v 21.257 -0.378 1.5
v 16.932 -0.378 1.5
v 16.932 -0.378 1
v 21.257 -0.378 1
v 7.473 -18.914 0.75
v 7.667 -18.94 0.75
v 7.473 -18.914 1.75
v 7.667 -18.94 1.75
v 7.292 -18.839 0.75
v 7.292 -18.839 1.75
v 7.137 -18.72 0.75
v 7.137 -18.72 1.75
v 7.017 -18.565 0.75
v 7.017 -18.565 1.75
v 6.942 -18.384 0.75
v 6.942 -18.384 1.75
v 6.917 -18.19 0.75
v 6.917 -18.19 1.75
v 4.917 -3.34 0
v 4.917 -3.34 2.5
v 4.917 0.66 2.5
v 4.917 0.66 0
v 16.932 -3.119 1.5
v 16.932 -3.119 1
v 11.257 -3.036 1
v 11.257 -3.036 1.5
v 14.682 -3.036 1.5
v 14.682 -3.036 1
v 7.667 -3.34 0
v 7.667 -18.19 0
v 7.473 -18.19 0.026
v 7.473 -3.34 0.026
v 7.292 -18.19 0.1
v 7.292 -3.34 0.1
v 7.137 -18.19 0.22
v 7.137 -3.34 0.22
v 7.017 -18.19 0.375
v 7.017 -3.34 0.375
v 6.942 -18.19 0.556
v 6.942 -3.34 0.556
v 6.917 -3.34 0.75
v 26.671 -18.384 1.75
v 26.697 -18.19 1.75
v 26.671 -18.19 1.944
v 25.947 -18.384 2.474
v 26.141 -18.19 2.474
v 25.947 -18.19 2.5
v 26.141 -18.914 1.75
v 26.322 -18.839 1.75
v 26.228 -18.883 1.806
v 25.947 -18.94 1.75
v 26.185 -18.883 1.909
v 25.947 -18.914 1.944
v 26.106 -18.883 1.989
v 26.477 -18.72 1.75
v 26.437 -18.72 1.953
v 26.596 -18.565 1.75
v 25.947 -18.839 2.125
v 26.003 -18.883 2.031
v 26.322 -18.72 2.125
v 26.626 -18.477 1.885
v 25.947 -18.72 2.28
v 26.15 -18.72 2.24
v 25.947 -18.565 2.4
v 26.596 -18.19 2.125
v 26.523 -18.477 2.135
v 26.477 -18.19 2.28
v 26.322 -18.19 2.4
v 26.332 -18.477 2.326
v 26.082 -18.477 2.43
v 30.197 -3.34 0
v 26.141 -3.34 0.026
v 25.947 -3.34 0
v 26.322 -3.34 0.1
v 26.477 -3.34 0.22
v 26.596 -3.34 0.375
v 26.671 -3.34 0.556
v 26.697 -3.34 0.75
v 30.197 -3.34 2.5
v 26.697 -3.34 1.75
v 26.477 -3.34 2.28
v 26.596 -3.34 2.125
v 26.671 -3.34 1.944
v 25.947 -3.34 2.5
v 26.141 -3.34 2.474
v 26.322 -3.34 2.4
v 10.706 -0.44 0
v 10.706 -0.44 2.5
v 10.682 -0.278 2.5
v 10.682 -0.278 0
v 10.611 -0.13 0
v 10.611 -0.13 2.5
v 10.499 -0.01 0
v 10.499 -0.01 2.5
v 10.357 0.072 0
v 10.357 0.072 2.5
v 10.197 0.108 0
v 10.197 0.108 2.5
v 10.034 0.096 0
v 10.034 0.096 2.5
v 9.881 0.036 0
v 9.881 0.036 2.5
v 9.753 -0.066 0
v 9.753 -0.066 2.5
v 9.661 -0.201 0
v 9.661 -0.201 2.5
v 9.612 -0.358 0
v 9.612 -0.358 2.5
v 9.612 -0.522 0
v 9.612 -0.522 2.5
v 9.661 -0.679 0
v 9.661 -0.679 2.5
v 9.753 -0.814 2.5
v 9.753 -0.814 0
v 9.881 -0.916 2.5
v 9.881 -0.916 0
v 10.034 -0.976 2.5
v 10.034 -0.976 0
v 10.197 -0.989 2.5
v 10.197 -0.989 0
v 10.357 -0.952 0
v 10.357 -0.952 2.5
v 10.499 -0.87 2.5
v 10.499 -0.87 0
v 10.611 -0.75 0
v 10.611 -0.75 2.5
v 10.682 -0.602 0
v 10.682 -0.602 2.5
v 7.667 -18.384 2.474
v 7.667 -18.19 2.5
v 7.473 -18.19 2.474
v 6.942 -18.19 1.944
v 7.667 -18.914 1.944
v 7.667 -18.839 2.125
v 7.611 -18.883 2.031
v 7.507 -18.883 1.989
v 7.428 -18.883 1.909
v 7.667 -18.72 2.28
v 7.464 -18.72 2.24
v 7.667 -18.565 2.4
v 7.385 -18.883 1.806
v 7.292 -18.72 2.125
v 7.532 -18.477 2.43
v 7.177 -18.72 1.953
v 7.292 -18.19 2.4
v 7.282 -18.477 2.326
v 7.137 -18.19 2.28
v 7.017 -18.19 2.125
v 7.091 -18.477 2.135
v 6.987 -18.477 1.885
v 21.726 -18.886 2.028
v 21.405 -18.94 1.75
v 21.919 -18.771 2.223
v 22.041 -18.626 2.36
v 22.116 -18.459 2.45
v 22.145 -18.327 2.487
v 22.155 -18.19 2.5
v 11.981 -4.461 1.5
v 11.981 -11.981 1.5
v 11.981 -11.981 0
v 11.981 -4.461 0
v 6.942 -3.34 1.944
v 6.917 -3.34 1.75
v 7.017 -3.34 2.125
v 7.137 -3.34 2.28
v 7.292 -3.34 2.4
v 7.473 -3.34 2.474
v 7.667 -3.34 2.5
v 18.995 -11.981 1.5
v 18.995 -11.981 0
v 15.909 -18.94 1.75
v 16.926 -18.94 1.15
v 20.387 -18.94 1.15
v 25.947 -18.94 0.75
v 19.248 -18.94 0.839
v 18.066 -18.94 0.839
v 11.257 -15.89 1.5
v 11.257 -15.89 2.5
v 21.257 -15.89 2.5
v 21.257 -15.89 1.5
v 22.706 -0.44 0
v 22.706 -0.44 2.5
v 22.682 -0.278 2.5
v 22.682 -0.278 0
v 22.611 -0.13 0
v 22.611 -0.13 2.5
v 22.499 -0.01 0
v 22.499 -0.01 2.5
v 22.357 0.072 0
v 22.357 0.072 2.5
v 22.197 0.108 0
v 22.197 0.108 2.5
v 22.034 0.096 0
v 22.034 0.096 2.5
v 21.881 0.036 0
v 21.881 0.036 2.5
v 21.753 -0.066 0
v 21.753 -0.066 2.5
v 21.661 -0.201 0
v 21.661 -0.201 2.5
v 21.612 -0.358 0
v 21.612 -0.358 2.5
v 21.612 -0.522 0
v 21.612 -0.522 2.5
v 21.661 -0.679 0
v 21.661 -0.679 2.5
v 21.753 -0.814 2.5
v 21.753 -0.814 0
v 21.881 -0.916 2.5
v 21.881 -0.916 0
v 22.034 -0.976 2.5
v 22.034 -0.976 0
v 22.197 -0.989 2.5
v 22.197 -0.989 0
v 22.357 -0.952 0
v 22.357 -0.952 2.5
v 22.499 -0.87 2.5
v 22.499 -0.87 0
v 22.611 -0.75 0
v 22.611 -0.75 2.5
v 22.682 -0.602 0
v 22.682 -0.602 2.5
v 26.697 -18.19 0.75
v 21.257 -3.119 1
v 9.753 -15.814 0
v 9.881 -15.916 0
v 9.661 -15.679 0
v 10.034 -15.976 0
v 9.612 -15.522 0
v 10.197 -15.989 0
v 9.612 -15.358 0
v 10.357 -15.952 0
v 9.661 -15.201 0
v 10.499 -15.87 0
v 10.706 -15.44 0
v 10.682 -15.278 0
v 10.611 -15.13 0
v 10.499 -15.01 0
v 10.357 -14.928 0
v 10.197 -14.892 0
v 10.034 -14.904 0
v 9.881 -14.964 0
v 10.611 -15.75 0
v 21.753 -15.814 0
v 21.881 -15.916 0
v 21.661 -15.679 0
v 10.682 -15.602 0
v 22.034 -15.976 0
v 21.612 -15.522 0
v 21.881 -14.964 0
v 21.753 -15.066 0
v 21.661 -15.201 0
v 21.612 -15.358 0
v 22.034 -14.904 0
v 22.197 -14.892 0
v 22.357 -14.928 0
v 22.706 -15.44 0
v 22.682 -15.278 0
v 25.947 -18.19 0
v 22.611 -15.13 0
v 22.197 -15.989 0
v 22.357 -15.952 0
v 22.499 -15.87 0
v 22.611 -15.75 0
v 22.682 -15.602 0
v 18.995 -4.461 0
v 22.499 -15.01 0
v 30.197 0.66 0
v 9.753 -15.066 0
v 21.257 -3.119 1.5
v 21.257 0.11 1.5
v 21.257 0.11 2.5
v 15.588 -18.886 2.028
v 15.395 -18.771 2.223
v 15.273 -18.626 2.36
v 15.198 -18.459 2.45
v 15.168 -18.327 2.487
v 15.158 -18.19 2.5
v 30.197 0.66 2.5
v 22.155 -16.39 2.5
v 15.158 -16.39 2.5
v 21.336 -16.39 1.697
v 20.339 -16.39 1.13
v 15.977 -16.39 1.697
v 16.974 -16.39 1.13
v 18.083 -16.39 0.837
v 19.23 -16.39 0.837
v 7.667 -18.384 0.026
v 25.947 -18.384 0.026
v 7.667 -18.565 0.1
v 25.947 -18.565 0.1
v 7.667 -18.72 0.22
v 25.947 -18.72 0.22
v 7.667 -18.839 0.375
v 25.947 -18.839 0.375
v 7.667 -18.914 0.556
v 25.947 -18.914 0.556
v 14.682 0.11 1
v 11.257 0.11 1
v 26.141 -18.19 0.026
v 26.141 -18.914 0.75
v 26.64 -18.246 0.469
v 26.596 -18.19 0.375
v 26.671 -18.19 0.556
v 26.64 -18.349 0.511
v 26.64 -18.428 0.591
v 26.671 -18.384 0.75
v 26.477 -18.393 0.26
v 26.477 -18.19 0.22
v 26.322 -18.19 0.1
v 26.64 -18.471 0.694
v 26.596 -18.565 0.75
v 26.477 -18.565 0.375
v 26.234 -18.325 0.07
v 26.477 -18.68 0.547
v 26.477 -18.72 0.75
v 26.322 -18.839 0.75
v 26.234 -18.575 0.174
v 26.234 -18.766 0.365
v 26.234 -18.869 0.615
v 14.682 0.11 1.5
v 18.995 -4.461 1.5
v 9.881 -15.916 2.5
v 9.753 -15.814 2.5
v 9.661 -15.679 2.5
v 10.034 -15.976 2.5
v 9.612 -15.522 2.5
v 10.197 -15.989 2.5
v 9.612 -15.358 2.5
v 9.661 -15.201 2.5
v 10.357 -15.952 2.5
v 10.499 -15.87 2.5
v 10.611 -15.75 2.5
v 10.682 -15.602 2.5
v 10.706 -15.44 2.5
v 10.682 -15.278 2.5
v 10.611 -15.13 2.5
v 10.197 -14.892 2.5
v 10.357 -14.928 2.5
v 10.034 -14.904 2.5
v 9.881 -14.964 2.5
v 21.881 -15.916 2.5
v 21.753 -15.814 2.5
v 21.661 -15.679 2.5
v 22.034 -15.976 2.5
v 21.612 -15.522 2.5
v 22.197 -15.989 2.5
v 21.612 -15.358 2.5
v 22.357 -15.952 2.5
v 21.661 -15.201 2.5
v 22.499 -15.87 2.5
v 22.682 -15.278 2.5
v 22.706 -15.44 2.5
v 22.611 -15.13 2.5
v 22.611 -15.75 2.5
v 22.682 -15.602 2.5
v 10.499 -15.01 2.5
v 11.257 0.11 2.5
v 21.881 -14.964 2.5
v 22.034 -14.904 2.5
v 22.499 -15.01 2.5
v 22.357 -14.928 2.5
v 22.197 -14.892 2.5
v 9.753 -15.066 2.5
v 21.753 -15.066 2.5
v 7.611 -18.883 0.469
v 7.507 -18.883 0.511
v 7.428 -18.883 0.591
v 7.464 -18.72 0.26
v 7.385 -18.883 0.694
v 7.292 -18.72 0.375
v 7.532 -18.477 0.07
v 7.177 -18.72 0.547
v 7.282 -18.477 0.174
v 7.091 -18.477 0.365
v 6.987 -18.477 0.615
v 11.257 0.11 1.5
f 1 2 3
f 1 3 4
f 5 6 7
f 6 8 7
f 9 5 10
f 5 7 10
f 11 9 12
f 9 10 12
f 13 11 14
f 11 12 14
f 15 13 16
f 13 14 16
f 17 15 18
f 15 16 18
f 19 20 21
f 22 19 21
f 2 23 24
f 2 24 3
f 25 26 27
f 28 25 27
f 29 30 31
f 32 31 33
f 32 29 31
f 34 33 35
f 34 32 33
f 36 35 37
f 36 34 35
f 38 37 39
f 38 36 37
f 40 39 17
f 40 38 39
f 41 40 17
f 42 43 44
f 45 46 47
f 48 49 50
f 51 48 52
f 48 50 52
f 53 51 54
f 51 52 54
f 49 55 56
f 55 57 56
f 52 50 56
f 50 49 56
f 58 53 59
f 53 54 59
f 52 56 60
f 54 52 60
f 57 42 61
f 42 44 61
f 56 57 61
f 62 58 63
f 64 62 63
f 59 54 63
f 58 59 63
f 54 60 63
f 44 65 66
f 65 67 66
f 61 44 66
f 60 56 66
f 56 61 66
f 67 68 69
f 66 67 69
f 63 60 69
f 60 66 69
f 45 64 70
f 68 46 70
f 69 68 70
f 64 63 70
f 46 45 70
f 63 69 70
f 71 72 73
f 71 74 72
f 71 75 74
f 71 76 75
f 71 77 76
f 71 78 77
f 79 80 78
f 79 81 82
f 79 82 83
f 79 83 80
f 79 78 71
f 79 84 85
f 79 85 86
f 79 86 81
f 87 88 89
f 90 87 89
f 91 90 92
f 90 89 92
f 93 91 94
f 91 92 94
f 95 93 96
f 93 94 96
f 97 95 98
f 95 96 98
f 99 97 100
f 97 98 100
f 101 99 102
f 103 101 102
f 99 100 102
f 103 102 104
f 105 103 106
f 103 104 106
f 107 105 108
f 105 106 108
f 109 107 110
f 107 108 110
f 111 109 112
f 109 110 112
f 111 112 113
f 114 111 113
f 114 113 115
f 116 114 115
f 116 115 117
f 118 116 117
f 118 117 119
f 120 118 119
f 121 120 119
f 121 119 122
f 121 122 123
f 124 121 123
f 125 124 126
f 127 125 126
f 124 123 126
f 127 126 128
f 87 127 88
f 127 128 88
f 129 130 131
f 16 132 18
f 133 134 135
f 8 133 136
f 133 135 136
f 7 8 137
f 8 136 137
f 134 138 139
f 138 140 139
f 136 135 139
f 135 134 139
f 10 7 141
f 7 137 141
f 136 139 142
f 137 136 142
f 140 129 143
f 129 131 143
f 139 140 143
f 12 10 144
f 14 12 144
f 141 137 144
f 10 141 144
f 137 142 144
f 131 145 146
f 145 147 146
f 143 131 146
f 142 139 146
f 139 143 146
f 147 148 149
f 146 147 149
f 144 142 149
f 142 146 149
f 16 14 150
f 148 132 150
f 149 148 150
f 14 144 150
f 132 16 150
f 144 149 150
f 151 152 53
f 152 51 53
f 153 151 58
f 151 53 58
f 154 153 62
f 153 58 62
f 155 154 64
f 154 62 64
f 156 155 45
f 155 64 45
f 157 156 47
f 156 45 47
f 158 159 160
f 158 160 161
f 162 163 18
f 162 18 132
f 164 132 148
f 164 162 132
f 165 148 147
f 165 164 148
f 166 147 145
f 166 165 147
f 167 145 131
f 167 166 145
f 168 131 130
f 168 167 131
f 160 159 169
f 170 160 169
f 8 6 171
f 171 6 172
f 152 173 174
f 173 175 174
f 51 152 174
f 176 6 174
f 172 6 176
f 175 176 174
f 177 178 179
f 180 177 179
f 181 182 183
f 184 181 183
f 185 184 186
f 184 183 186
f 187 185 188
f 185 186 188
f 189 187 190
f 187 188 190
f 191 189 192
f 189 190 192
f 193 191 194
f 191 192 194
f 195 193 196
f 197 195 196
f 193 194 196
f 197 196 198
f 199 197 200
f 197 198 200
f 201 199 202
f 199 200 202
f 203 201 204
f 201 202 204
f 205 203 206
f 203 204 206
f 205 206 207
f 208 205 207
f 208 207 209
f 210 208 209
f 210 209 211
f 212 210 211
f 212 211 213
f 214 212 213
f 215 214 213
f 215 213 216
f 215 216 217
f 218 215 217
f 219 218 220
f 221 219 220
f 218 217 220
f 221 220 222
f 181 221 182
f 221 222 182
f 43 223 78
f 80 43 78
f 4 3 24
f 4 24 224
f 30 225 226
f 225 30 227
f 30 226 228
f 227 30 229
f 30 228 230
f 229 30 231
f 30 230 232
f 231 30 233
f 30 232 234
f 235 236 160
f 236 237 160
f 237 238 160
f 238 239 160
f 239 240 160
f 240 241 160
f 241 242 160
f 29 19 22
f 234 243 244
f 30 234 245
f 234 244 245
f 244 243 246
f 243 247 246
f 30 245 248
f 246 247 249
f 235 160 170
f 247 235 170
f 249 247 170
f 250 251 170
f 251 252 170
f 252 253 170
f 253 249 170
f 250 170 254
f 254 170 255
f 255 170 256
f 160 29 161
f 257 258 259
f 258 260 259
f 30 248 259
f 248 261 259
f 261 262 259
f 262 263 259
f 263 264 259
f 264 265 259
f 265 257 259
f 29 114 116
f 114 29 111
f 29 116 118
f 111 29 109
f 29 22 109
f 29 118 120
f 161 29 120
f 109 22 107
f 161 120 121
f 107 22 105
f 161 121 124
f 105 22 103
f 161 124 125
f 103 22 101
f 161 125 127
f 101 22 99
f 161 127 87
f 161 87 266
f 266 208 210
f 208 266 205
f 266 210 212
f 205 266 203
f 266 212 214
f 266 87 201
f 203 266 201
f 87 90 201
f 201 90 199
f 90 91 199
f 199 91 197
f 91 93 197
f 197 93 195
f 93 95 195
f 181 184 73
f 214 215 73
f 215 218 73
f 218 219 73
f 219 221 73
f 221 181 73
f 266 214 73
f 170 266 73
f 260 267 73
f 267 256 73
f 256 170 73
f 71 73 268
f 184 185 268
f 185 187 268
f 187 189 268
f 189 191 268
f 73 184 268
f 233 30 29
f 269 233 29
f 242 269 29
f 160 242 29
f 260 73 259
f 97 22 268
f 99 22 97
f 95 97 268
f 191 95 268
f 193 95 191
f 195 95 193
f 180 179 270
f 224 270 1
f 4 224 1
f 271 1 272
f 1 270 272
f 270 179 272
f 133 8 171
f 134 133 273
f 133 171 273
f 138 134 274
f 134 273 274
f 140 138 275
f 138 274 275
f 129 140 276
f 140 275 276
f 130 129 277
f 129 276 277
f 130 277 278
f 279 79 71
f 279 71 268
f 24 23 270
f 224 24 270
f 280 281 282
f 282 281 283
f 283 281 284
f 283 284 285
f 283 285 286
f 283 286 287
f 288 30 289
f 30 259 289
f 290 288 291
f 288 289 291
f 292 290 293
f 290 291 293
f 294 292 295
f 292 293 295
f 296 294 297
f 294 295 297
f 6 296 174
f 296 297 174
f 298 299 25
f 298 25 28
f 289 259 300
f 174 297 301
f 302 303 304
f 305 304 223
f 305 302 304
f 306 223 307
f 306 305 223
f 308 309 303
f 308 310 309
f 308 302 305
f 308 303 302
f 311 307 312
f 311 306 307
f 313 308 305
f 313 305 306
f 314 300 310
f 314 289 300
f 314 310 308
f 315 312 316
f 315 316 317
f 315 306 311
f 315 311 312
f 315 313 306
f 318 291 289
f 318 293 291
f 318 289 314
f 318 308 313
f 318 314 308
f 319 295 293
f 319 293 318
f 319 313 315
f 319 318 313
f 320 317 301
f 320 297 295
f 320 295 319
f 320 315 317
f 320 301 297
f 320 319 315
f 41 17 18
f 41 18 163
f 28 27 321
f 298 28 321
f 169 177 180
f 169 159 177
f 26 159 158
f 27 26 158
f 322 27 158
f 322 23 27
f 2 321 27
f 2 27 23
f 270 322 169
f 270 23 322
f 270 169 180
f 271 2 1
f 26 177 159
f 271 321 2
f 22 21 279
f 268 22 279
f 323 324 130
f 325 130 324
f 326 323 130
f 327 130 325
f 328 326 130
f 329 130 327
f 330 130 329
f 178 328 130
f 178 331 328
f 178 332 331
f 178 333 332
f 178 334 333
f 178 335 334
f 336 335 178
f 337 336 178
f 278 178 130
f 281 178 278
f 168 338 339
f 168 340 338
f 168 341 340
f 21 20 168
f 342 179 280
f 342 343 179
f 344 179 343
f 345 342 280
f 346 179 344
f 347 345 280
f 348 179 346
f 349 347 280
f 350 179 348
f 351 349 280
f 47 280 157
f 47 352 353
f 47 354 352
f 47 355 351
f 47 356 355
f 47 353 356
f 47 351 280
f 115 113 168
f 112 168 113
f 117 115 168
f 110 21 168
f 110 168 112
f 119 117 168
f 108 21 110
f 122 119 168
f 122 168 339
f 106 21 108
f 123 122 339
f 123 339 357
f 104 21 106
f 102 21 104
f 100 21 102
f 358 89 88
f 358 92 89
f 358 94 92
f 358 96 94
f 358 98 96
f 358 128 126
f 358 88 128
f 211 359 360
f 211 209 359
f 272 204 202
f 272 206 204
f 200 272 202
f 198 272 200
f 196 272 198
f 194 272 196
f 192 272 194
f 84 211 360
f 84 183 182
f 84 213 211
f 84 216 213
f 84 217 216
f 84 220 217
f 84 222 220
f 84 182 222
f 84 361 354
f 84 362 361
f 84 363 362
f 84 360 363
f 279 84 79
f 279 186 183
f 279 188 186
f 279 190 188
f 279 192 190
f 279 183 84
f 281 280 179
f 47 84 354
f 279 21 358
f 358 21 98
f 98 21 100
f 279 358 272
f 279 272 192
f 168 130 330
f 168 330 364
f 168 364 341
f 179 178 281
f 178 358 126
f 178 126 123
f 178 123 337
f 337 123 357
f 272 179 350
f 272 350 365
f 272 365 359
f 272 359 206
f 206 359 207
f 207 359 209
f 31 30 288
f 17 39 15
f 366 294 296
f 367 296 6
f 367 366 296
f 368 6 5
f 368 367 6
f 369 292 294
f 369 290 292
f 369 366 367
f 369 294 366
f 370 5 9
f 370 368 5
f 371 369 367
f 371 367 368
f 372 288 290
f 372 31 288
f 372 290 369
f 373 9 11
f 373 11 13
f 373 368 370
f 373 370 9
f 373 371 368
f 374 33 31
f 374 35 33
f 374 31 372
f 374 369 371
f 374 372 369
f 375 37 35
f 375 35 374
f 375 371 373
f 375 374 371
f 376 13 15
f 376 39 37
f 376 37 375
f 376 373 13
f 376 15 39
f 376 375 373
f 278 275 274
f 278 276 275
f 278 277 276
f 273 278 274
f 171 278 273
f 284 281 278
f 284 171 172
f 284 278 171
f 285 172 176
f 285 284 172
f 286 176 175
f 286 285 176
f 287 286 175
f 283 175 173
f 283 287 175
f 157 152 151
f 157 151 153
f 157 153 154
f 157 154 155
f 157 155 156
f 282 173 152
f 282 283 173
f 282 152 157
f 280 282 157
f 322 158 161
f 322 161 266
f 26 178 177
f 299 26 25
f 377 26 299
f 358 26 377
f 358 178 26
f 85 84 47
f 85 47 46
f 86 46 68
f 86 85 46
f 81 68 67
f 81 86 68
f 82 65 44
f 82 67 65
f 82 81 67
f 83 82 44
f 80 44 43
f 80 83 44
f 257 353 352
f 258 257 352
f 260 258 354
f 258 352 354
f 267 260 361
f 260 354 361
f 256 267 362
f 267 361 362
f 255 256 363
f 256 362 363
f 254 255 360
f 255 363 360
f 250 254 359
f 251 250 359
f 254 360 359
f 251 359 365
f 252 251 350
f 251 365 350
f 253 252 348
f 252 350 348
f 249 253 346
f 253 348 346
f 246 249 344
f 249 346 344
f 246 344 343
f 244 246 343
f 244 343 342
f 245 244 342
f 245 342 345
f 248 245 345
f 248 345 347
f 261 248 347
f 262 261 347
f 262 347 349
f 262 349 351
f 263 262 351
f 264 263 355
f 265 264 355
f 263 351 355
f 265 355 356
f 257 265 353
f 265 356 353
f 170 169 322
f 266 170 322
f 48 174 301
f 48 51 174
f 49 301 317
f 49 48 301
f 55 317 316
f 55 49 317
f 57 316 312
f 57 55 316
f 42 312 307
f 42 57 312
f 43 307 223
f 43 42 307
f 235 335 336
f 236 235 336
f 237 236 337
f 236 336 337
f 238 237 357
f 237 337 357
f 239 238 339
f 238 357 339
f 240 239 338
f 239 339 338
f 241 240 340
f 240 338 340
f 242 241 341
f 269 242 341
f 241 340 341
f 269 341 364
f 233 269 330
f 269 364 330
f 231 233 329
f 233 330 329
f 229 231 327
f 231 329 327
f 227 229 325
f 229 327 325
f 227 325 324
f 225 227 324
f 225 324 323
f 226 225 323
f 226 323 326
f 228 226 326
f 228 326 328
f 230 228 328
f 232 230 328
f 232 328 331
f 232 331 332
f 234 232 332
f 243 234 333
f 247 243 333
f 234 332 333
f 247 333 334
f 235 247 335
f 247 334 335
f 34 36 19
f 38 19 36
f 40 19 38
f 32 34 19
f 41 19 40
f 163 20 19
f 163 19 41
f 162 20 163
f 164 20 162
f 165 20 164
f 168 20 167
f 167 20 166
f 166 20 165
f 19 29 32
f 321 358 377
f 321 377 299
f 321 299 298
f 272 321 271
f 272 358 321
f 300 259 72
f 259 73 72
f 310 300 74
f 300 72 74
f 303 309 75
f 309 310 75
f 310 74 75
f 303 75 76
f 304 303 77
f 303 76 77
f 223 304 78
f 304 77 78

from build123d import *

# Parameters (mm, degrees)
SKETCH1_W               = 19.78
SKETCH1_H               = 22
BOSS_EXTRUDE1_DEPTH     = 2.5
SKETCH2_R               = 0.55
CUT_EXTRUDE1_DEPTH      = 2.5
SKETCH3_W               = 7.014228963
SKETCH3_H               = 7.519558389
CUT_EXTRUDE2_DEPTH      = 2.5
SKETCH4_W               = 10
SKETCH4_H               = 16
CUT_EXTRUDE3_DEPTH      = 1
SKETCH5_W               = 4.325292028
SKETCH5_H               = 2.74046394
SKETCH5_W_2             = 3.425085756
SKETCH5_H_2             = 3.145892333
CUT_EXTRUDE4_DEPTH      = 0.5
SKETCH6_R               = 4.45
CUT_EXTRUDE5_DEPTH      = 1.5
CUT_EXTRUDE5_DEPTH_BACK = 1.1
SKETCH7_W               = 19.78
SKETCH7_H               = 2.5
CUT_EXTRUDE6_DEPTH      = 2.4
SKETCH8_W               = 3.5
SKETCH8_H               = 4
SKETCH8_W_2             = 2
BOSS_EXTRUDE2_DEPTH     = 2.5
FILLET1_R               = 0.75


with BuildPart() as part:
    # Sketch1 → Boss-Extrude1 (new body)
    with BuildSketch(Plane.XY):
        with Locations((16.80685162, -7.939657117)):
            Rectangle(SKETCH1_W, SKETCH1_H)
    extrude(amount=BOSS_EXTRUDE1_DEPTH)

    # Sketch2 → Cut-Extrude1 (cut)
    with BuildSketch(Plane.XY.offset(2.5)):
        with Locations((22.156215749, -0.440049881)):
            Circle(SKETCH2_R)
        with Locations((22.156215749, -15.440049881)):
            Circle(SKETCH2_R)
        with Locations((10.156215749, -15.440049881)):
            Circle(SKETCH2_R)
        with Locations((10.156215749, -0.440049881)):
            Circle(SKETCH2_R)
    extrude(amount=-CUT_EXTRUDE1_DEPTH, mode=Mode.SUBTRACT)

    # Sketch3 → Cut-Extrude2 (cut)
    with BuildSketch(Plane.XY.offset(2.5)):
        with Locations((15.488045681, -8.221060457)):
            Rectangle(SKETCH3_W, SKETCH3_H)
    extrude(amount=-CUT_EXTRUDE2_DEPTH, mode=Mode.SUBTRACT)

    # Sketch4 → Cut-Extrude3 (cut)
    with BuildSketch(Plane.XY.offset(2.5)):
        with Locations((16.25685162, -7.889657117)):
            Rectangle(SKETCH4_W, SKETCH4_H)
    extrude(amount=-CUT_EXTRUDE3_DEPTH, mode=Mode.SUBTRACT)

    # Sketch5 → Cut-Extrude4 (cut)
    with BuildSketch(Plane.XY.offset(1.5)):
        with Locations((19.094205606, -1.748569373)):
            Rectangle(SKETCH5_W, SKETCH5_H)
        with Locations((12.969394498, -1.462603284)):
            Rectangle(SKETCH5_W_2, SKETCH5_H_2)
    extrude(amount=-CUT_EXTRUDE4_DEPTH, mode=Mode.SUBTRACT)

    # Sketch6 → Cut-Extrude5 (cut, two sides)
    with BuildSketch(Plane.XZ.offset(17.489657117)) as cut_extrude5_sk:
        with Locations((18.65685162, 5.25)):
            Circle(SKETCH6_R)
    extrude(amount=CUT_EXTRUDE5_DEPTH, mode=Mode.SUBTRACT)
    extrude(cut_extrude5_sk.sketch, amount=-CUT_EXTRUDE5_DEPTH_BACK, mode=Mode.SUBTRACT)

    # Sketch7 → Cut-Extrude6 (cut)
    with BuildSketch(Plane(origin=(0, 3.060342883, 0), x_dir=(1, 0, 0), z_dir=(0, 1, 0))):
        with Locations((16.80685162, -1.25)):
            Rectangle(SKETCH7_W, SKETCH7_H)
    extrude(amount=-CUT_EXTRUDE6_DEPTH, mode=Mode.SUBTRACT)

    # Sketch8 → Boss-Extrude2 (add)
    with BuildSketch(Plane.XY.offset(2.5)):
        with Locations((28.44685162, -1.339657117)):
            Rectangle(SKETCH8_W, SKETCH8_H)
        with Locations((5.91685162, -1.339657117)):
            Rectangle(SKETCH8_W_2, SKETCH8_H)
    extrude(amount=-BOSS_EXTRUDE2_DEPTH)

    # Fillet1
    fillet1_edges = [part.edges().sort_by_distance(p)[0] for p in [
        (6.91685162, -11.139657117, 0),
        (6.91685162, -11.139657117, 2.5),
        (11.037566052, -18.939657117, 2.5),
        (26.69685162, -11.139657117, 2.5),
        (16.80685162, -18.939657117, 0),
        (26.69685162, -11.139657117, 0),
        (26.69685162, -18.939657117, 1.25),
        (6.91685162, -18.939657117, 1.25),
        (24.426137189, -18.939657117, 2.5),
    ]]
    fillet(fillet1_edges, radius=FILLET1_R)


solid = part.part
